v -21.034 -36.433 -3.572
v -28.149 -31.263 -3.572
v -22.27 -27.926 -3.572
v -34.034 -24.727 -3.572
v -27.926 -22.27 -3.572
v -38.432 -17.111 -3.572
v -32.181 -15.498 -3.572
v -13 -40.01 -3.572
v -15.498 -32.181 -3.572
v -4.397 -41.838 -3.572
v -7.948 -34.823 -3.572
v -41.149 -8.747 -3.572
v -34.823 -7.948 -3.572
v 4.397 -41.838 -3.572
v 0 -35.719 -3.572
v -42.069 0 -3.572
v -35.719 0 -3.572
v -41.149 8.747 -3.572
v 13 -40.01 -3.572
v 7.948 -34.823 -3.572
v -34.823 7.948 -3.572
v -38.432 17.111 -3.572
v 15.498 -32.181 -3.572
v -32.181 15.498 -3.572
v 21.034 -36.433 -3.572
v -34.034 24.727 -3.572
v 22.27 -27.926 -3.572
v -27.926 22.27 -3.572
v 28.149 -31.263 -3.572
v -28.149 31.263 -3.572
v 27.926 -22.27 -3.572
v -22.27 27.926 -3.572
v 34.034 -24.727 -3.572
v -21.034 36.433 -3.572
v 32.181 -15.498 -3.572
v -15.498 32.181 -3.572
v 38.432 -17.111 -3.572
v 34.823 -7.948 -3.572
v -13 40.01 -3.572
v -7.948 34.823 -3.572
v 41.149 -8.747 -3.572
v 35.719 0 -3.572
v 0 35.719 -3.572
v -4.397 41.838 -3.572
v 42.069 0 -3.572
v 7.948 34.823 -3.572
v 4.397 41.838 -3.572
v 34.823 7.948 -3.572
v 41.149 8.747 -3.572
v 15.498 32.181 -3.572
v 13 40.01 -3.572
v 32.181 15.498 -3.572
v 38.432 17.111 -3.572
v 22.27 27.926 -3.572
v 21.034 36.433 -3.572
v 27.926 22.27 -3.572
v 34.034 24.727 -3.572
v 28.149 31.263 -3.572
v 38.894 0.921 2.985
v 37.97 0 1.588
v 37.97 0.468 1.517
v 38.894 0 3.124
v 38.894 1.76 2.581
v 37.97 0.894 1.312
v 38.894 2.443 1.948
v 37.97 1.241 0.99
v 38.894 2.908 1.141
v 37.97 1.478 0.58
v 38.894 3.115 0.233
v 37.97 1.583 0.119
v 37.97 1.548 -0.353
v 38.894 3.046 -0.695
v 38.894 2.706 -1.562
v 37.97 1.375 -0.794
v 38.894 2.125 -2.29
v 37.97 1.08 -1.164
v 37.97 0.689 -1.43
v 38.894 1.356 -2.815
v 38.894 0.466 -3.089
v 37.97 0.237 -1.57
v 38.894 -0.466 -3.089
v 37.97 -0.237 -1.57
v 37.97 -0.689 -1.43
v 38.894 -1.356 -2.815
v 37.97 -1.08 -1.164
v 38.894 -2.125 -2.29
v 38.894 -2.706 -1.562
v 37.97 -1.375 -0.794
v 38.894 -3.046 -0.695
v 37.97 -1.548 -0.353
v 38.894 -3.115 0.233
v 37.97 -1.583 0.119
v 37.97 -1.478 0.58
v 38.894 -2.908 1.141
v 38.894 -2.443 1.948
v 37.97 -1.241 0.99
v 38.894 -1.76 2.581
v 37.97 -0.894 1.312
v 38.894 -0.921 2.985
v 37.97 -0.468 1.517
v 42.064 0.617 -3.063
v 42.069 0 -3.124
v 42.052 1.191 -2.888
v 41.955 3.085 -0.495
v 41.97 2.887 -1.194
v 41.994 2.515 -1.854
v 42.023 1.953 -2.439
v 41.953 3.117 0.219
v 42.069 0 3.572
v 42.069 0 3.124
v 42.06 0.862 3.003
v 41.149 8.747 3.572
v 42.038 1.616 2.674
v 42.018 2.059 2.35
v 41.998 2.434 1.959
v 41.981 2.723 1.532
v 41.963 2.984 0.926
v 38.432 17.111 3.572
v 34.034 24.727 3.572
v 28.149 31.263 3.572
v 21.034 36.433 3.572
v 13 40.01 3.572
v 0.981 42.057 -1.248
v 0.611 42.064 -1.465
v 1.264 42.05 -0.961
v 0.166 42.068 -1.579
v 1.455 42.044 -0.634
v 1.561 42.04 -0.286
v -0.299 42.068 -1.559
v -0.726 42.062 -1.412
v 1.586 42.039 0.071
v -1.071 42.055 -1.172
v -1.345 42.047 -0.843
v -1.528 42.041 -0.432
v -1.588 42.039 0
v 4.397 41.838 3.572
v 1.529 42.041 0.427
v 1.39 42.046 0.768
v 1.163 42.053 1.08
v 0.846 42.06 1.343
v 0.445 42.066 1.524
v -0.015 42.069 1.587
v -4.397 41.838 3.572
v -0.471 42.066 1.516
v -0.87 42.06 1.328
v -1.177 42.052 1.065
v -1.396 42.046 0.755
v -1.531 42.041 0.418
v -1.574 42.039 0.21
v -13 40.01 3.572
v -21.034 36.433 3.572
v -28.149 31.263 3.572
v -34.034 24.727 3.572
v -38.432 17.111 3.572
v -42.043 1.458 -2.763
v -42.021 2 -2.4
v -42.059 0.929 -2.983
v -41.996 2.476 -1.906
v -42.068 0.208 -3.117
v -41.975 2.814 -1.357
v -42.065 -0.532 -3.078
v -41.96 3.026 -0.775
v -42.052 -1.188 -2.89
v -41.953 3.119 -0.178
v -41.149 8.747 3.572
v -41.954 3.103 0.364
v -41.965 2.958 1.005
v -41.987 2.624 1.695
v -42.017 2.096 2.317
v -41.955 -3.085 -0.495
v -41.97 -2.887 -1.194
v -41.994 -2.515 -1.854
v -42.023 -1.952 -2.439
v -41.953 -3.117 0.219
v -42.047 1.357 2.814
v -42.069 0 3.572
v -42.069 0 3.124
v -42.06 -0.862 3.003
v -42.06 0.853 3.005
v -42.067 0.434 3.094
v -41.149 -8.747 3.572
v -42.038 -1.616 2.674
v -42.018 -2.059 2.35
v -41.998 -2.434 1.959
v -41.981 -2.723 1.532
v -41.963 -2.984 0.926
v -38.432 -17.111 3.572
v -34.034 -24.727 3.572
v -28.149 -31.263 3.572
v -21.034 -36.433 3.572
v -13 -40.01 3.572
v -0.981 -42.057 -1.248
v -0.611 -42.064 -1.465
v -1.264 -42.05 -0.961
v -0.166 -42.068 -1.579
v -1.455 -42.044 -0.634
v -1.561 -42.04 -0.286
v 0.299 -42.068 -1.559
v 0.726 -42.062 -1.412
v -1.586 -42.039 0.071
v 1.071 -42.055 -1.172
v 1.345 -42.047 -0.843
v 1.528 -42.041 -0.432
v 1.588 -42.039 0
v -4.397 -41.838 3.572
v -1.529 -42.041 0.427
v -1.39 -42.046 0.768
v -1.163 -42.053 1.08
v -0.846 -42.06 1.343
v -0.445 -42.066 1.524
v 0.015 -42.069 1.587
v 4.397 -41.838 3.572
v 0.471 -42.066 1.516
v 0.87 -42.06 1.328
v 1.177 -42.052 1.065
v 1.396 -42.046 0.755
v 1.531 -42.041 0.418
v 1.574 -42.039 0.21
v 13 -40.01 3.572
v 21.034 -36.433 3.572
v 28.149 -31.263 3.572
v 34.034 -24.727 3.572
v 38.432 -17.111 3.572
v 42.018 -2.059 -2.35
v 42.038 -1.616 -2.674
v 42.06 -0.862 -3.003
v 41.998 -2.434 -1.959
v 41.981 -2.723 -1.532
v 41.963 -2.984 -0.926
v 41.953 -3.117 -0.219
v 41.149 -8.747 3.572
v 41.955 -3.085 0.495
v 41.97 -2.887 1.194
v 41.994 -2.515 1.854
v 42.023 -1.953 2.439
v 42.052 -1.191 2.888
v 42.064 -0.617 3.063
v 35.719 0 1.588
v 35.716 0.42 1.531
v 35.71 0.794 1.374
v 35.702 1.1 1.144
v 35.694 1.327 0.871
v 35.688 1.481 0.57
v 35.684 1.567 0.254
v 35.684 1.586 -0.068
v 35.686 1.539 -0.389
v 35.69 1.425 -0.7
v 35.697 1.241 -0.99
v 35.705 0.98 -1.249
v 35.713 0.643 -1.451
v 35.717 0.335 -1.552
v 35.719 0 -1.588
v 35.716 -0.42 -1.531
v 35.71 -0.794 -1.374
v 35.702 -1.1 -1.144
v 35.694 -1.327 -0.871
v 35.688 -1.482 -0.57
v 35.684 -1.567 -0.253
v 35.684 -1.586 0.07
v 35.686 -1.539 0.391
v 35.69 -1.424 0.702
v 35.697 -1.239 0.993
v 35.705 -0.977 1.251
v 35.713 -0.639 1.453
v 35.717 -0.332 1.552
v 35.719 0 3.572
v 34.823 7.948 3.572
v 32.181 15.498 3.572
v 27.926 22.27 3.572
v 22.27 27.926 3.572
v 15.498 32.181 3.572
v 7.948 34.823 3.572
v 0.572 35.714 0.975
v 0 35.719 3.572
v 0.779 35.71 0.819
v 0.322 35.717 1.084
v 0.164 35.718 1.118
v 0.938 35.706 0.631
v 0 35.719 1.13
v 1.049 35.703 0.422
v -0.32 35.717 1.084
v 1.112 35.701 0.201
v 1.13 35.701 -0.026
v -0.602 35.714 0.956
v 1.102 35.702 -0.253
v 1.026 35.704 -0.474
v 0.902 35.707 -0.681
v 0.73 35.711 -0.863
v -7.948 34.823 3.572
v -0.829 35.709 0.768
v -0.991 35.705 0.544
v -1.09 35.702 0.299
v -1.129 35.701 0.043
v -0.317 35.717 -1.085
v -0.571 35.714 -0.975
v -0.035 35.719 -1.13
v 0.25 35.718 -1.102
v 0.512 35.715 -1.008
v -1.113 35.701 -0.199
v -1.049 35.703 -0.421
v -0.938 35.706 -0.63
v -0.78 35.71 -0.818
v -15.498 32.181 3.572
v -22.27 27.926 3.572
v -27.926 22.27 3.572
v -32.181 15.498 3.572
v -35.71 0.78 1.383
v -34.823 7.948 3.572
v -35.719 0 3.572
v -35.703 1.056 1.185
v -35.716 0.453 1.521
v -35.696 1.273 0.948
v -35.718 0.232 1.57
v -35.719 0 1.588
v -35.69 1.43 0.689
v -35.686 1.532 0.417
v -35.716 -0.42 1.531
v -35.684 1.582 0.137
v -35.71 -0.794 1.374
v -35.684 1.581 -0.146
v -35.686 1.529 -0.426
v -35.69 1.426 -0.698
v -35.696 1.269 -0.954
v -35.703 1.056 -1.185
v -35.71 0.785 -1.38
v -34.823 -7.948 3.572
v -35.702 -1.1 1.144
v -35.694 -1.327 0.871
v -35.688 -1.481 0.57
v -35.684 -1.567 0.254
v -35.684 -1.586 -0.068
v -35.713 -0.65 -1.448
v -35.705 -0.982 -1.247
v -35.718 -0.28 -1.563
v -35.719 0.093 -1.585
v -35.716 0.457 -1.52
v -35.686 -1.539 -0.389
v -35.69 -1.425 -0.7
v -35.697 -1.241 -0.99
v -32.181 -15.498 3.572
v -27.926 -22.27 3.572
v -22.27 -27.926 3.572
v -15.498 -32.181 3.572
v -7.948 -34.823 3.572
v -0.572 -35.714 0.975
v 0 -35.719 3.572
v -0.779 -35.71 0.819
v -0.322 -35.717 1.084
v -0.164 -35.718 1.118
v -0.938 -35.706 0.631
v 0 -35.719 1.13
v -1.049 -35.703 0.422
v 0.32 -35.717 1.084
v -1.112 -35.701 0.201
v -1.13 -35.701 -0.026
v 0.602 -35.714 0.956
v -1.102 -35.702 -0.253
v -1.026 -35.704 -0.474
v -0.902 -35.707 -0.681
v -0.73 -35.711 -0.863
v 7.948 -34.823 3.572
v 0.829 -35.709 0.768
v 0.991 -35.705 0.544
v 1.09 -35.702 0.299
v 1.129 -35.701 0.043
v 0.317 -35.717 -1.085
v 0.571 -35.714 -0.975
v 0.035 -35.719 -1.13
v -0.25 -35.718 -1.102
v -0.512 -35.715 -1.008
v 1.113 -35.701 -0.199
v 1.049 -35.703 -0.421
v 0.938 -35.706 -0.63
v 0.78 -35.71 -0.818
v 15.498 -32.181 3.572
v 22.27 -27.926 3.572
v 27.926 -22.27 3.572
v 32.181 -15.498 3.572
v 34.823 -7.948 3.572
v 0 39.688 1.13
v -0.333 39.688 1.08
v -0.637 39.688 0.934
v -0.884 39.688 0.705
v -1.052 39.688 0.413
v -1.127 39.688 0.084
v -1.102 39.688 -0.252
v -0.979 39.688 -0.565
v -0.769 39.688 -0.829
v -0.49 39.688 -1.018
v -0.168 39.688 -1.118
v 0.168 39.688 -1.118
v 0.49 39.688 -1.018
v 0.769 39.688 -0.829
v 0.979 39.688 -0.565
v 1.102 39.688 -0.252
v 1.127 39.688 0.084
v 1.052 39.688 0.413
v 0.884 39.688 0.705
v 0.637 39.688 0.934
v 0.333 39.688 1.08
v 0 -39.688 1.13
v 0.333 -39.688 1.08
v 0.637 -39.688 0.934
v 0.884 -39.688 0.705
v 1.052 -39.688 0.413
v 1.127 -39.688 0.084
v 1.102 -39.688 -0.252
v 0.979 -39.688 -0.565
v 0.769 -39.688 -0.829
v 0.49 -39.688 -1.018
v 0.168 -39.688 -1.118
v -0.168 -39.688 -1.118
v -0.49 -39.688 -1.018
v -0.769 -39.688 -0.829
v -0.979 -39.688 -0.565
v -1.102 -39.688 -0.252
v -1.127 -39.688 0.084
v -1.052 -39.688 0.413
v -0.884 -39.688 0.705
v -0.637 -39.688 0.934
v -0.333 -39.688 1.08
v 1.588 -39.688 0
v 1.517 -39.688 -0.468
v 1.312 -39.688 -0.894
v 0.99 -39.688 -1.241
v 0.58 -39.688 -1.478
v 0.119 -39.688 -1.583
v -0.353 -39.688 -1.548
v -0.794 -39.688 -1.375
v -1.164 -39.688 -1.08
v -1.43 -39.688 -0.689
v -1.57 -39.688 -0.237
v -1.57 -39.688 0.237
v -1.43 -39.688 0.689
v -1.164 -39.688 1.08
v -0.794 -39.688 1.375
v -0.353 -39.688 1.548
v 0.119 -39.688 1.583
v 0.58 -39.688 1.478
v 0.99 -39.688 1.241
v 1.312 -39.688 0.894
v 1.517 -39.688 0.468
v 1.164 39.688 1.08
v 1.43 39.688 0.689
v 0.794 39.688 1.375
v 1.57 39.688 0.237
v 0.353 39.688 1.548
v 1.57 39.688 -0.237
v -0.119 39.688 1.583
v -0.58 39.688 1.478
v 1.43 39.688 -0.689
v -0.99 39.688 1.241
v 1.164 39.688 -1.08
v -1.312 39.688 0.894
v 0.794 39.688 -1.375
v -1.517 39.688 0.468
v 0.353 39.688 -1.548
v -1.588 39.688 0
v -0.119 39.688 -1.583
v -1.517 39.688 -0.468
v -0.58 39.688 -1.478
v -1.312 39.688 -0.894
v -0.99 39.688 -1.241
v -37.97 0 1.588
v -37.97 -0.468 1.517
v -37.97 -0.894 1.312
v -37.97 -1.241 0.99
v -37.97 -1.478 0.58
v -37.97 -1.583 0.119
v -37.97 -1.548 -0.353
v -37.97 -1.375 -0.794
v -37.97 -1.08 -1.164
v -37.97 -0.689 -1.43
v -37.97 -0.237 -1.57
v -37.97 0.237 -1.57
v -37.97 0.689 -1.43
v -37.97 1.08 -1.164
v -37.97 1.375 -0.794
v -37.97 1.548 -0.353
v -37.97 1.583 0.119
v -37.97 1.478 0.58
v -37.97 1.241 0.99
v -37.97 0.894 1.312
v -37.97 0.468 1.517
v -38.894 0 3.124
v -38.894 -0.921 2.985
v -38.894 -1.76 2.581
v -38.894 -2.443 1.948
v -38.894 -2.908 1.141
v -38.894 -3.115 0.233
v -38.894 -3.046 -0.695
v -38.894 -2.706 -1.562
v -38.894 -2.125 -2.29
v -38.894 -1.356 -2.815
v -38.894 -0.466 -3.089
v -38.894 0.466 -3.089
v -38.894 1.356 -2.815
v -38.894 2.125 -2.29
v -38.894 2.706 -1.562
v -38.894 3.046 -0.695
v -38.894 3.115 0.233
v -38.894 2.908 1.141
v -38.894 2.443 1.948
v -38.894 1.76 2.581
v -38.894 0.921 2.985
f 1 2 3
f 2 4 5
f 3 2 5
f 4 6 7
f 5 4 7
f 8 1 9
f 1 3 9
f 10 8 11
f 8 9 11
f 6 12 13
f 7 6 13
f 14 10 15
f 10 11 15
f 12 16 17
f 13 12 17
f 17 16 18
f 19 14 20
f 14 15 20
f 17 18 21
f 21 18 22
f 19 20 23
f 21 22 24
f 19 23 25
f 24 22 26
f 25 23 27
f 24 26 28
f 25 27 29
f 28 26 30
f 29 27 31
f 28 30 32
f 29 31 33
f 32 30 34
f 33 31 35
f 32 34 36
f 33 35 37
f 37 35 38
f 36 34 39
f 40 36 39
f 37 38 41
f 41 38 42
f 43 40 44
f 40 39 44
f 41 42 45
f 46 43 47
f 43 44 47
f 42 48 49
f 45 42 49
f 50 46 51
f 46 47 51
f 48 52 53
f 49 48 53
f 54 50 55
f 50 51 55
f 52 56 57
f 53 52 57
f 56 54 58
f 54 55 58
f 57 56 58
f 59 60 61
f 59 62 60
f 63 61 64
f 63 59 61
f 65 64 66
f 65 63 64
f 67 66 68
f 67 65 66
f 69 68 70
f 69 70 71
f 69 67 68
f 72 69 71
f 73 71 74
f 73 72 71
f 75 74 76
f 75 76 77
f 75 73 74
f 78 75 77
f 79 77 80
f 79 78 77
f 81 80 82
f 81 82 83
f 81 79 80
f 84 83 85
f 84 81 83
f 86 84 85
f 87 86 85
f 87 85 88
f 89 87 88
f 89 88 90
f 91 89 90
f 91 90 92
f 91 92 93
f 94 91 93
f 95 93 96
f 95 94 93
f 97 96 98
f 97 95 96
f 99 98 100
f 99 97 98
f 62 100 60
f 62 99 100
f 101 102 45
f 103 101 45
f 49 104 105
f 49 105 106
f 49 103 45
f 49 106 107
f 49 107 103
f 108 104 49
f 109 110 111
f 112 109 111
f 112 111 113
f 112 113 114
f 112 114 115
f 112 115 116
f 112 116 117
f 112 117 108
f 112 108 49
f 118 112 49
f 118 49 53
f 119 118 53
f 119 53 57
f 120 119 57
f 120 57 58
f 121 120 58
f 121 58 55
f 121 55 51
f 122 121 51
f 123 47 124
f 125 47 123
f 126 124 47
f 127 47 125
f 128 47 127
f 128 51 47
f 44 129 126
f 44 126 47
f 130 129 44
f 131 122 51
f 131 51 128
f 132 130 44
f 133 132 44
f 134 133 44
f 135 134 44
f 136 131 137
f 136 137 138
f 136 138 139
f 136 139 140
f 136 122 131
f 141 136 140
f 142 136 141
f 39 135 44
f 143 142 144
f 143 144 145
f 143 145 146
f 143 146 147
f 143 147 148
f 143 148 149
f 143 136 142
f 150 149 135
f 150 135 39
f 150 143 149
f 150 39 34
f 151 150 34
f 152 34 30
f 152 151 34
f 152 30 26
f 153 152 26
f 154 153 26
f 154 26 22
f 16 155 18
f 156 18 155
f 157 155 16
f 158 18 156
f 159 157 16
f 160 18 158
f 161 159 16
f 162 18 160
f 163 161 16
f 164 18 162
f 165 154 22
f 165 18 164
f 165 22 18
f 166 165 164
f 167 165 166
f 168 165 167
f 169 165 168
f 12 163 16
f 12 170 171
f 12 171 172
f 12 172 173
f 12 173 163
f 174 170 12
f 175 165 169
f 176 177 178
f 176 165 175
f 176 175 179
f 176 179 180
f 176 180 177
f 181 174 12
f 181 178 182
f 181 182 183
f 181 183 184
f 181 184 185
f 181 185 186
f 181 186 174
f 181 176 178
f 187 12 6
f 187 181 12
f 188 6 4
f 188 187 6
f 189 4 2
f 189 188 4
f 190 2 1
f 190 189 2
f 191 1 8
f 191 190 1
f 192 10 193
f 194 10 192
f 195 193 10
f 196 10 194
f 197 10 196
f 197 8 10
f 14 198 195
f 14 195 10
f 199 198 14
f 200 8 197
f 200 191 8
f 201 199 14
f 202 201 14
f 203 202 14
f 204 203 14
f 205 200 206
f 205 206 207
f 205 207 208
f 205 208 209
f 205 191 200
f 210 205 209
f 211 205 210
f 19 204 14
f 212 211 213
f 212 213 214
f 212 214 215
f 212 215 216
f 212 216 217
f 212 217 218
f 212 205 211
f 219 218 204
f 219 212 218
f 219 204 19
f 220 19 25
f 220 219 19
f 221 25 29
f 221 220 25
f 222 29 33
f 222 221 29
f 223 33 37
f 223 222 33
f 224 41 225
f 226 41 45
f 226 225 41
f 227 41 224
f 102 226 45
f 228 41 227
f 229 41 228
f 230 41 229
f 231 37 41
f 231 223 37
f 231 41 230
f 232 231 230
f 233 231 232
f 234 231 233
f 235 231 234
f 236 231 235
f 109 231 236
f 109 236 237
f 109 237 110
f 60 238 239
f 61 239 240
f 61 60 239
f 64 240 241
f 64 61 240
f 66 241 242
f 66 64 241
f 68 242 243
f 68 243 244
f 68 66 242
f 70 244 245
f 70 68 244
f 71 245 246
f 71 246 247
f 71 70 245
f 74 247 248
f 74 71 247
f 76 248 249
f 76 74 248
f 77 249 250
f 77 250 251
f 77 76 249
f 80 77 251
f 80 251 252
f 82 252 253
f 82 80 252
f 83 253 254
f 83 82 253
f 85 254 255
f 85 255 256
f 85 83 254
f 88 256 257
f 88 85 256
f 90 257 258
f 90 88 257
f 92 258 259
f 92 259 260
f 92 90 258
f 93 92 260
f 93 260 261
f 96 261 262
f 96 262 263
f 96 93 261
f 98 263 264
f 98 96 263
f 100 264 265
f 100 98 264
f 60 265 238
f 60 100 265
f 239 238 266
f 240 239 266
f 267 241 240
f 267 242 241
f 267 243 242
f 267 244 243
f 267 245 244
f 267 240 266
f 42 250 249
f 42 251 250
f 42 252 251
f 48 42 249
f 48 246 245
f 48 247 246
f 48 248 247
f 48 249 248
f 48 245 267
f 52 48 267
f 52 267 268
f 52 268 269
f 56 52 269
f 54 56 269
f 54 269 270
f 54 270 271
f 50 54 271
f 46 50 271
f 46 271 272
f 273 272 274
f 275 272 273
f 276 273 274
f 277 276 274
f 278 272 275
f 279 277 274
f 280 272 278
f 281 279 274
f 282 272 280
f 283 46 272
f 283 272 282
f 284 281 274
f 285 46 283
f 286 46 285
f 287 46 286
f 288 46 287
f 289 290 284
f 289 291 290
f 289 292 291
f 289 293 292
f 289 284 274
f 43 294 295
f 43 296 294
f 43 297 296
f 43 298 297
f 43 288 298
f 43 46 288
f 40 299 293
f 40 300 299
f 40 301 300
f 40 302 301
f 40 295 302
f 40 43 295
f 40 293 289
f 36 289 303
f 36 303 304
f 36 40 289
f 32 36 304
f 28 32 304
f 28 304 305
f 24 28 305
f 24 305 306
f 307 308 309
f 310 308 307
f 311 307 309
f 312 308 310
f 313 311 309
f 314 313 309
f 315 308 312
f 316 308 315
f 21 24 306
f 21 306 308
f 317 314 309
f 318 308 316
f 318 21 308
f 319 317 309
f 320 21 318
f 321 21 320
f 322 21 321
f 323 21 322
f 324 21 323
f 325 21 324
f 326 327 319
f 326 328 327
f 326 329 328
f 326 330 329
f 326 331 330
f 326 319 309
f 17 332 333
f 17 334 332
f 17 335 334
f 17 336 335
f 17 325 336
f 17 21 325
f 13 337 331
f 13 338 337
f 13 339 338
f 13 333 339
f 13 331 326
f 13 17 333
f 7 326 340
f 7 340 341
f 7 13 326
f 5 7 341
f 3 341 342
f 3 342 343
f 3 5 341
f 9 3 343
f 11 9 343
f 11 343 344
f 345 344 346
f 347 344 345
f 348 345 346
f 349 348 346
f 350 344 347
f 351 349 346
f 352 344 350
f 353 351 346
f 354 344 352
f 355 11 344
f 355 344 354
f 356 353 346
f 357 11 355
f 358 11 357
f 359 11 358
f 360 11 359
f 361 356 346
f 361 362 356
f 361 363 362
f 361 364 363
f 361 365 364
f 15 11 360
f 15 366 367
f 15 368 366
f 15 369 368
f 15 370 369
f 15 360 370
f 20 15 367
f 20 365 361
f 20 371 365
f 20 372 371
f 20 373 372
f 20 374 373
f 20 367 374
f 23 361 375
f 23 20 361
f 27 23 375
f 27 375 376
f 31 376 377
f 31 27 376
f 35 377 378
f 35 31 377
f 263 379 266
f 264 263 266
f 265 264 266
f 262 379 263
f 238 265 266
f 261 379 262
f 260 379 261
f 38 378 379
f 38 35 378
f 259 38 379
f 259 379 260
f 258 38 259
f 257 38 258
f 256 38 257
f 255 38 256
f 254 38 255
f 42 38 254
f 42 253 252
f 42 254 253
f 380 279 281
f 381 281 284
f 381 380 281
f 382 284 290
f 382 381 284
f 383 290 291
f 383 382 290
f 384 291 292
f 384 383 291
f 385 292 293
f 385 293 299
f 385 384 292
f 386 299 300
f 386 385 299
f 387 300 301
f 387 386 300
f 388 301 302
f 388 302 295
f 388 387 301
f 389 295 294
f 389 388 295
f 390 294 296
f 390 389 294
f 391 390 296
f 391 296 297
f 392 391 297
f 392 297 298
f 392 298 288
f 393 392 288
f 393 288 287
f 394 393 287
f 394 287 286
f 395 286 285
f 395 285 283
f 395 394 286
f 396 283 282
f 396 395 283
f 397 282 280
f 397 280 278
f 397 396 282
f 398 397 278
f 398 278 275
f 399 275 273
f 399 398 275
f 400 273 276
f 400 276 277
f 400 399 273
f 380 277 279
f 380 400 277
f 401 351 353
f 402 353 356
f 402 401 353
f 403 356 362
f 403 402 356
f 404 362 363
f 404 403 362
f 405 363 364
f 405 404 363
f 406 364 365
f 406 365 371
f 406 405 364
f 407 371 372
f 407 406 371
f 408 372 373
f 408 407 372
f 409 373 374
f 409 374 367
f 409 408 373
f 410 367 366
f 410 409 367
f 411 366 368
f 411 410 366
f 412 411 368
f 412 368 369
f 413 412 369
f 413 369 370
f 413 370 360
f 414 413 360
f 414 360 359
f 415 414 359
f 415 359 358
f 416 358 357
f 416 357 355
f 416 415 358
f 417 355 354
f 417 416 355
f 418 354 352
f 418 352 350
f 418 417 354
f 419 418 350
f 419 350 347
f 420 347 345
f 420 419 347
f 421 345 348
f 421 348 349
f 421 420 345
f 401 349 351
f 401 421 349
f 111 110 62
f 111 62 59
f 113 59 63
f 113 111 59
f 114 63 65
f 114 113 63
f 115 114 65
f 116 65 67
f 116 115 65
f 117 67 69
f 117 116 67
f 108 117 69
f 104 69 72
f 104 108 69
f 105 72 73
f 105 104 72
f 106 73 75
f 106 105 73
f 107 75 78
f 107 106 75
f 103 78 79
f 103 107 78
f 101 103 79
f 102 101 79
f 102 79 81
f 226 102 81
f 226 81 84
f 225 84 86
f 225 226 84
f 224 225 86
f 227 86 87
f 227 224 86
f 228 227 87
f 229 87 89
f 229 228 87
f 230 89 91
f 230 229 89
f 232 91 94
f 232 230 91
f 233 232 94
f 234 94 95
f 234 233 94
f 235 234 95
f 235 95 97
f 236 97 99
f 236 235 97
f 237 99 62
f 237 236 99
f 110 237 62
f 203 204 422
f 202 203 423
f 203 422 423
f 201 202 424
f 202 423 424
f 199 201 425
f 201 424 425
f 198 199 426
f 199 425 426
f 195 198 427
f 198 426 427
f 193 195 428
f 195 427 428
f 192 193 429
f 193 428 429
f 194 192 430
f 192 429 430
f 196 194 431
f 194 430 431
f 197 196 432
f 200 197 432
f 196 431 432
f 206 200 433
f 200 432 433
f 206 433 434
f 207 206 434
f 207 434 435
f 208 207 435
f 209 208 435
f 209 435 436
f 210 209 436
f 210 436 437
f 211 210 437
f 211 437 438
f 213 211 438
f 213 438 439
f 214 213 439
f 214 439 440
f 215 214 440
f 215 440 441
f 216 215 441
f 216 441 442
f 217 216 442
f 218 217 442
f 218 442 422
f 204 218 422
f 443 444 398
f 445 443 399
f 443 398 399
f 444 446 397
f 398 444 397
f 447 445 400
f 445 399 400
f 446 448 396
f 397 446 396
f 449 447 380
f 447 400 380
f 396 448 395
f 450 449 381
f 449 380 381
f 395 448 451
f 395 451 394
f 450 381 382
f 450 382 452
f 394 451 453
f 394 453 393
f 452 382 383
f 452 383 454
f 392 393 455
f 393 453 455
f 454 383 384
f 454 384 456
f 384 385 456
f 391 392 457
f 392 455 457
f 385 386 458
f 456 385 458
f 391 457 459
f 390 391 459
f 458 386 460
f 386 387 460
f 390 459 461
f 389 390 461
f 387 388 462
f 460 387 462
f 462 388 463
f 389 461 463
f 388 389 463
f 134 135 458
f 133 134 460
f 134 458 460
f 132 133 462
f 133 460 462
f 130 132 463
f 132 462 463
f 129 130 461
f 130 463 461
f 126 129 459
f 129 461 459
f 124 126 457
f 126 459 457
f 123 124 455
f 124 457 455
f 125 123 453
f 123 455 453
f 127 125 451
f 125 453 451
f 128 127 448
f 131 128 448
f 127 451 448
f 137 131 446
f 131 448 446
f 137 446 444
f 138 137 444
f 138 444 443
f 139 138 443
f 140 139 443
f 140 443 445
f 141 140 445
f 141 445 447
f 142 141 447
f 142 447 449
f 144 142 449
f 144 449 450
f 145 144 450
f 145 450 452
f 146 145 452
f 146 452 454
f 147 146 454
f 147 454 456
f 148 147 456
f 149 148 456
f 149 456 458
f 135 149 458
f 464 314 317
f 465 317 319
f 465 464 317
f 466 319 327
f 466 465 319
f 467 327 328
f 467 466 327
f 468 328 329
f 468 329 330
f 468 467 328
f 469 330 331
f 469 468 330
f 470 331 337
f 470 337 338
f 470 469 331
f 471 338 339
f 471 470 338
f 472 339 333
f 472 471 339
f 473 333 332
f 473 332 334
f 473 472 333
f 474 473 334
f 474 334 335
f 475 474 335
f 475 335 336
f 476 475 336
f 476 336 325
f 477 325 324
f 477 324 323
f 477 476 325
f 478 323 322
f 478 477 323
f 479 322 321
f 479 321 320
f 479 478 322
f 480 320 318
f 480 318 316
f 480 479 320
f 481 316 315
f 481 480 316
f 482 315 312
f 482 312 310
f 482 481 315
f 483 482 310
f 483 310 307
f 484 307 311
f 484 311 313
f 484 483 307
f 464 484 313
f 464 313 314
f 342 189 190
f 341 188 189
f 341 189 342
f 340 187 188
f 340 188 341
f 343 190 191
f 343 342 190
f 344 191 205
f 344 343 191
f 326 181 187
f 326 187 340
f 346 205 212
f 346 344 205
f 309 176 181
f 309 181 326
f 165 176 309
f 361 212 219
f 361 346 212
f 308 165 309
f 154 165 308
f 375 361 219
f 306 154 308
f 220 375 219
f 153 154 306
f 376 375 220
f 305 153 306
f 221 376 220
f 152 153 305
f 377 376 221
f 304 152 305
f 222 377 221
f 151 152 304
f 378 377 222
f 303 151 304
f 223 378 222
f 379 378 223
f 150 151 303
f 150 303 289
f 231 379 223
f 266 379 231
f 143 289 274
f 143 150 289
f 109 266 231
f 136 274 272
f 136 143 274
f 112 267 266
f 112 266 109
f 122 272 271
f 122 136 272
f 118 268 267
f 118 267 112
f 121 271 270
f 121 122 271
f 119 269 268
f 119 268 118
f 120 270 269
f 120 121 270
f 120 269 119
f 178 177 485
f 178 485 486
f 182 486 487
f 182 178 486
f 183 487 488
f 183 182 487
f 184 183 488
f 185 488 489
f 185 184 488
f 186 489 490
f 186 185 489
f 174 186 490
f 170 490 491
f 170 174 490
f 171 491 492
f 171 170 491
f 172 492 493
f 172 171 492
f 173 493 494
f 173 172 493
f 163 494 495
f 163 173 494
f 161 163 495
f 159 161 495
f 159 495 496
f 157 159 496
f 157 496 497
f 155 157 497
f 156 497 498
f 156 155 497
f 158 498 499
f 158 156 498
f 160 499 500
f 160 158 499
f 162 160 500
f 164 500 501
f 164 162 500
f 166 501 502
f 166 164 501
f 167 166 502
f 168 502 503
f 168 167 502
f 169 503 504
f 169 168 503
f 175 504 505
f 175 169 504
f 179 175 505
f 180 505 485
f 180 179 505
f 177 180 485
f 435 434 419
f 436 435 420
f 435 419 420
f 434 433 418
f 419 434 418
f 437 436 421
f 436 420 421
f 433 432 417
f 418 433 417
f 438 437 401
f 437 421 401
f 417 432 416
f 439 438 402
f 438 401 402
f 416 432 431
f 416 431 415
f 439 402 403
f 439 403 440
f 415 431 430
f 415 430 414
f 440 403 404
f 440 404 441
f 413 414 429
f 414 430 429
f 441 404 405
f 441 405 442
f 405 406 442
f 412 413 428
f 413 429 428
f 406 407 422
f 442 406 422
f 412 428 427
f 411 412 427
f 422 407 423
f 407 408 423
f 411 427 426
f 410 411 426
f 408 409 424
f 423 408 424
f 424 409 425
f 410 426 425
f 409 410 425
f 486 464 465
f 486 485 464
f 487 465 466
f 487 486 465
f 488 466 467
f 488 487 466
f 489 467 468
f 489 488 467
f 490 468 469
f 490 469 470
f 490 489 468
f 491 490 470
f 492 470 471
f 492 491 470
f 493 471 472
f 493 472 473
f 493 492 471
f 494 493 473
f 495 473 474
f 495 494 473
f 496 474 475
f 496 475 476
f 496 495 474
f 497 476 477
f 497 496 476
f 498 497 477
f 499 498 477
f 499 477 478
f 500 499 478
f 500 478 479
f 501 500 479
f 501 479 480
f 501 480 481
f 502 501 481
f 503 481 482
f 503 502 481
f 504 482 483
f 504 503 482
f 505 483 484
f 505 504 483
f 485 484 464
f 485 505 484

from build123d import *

# Parameters (mm, degrees)
SKETCH1_R           = 42.06875
SKETCH1_R_2         = 35.71875
BOSS_EXTRUDE1_DEPTH = 3.571875
HOLE1_D             = 3.175
HOLE1_DEPTH         = 2.38125
CIRPATTERN1_COUNT   = 2


with BuildPart() as part:
    # Sketch1 → Boss-Extrude1 (new body, symmetric)
    with BuildSketch(Plane.XY):
        Circle(SKETCH1_R)
        Circle(SKETCH1_R_2, mode=Mode.SUBTRACT)
    extrude(amount=BOSS_EXTRUDE1_DEPTH, both=True)

    # Hole1
    with Locations(Plane(origin=(0, 42.06875, 0), x_dir=(1, 0, 0), z_dir=(0, 1, 0))):
        with Locations((0, 0)):
            hole1 = Hole(HOLE1_D / 2, depth=HOLE1_DEPTH)

    # Sketch7 → #4-40 Tapped Hole1 (revolve, cut)
    with BuildSketch(Plane(origin=(0, 39.6875, 0), x_dir=(0, 0, 1), z_dir=(1, 0, 0))):
        Polygon((0, 0), (0, 8.299152758), (1.1303, 7.62), (1.1303, 0), align=None)
    f_4_40_tapped_hole1 = revolve(axis=Axis((0, 46.0375, 0), (0, -1, 0)), mode=Mode.SUBTRACT)

    # Sketch8 → Hole2 (revolve, cut)
    with BuildSketch(Plane(origin=(-42.06875, 0, 0), x_dir=(0, 0, 1), z_dir=(0, 1, 0))):
        Polygon((0, 0), (0, 12.7), (1.5875, 12.7), (1.5875, 4.098342513), (3.1242, 3.175), (3.1242, 0), align=None)
    hole2 = revolve(axis=Axis((-48.198773899, 0, 0), (1, 0, 0)), mode=Mode.SUBTRACT)

    # CirPattern1: Hole1, #4-40 Tapped Hole1, Hole2 ×2 about axis
    cirpattern1_axis = Axis((0, 0, 3.571875), (0, 0, -1))
    for i in range(1, CIRPATTERN1_COUNT):
        add(hole1.rotate(cirpattern1_axis, i * 360 / CIRPATTERN1_COUNT), mode=Mode.SUBTRACT)
        add(f_4_40_tapped_hole1.rotate(cirpattern1_axis, i * 360 / CIRPATTERN1_COUNT), mode=Mode.SUBTRACT)
        add(hole2.rotate(cirpattern1_axis, i * 360 / CIRPATTERN1_COUNT), mode=Mode.SUBTRACT)


solid = part.part
